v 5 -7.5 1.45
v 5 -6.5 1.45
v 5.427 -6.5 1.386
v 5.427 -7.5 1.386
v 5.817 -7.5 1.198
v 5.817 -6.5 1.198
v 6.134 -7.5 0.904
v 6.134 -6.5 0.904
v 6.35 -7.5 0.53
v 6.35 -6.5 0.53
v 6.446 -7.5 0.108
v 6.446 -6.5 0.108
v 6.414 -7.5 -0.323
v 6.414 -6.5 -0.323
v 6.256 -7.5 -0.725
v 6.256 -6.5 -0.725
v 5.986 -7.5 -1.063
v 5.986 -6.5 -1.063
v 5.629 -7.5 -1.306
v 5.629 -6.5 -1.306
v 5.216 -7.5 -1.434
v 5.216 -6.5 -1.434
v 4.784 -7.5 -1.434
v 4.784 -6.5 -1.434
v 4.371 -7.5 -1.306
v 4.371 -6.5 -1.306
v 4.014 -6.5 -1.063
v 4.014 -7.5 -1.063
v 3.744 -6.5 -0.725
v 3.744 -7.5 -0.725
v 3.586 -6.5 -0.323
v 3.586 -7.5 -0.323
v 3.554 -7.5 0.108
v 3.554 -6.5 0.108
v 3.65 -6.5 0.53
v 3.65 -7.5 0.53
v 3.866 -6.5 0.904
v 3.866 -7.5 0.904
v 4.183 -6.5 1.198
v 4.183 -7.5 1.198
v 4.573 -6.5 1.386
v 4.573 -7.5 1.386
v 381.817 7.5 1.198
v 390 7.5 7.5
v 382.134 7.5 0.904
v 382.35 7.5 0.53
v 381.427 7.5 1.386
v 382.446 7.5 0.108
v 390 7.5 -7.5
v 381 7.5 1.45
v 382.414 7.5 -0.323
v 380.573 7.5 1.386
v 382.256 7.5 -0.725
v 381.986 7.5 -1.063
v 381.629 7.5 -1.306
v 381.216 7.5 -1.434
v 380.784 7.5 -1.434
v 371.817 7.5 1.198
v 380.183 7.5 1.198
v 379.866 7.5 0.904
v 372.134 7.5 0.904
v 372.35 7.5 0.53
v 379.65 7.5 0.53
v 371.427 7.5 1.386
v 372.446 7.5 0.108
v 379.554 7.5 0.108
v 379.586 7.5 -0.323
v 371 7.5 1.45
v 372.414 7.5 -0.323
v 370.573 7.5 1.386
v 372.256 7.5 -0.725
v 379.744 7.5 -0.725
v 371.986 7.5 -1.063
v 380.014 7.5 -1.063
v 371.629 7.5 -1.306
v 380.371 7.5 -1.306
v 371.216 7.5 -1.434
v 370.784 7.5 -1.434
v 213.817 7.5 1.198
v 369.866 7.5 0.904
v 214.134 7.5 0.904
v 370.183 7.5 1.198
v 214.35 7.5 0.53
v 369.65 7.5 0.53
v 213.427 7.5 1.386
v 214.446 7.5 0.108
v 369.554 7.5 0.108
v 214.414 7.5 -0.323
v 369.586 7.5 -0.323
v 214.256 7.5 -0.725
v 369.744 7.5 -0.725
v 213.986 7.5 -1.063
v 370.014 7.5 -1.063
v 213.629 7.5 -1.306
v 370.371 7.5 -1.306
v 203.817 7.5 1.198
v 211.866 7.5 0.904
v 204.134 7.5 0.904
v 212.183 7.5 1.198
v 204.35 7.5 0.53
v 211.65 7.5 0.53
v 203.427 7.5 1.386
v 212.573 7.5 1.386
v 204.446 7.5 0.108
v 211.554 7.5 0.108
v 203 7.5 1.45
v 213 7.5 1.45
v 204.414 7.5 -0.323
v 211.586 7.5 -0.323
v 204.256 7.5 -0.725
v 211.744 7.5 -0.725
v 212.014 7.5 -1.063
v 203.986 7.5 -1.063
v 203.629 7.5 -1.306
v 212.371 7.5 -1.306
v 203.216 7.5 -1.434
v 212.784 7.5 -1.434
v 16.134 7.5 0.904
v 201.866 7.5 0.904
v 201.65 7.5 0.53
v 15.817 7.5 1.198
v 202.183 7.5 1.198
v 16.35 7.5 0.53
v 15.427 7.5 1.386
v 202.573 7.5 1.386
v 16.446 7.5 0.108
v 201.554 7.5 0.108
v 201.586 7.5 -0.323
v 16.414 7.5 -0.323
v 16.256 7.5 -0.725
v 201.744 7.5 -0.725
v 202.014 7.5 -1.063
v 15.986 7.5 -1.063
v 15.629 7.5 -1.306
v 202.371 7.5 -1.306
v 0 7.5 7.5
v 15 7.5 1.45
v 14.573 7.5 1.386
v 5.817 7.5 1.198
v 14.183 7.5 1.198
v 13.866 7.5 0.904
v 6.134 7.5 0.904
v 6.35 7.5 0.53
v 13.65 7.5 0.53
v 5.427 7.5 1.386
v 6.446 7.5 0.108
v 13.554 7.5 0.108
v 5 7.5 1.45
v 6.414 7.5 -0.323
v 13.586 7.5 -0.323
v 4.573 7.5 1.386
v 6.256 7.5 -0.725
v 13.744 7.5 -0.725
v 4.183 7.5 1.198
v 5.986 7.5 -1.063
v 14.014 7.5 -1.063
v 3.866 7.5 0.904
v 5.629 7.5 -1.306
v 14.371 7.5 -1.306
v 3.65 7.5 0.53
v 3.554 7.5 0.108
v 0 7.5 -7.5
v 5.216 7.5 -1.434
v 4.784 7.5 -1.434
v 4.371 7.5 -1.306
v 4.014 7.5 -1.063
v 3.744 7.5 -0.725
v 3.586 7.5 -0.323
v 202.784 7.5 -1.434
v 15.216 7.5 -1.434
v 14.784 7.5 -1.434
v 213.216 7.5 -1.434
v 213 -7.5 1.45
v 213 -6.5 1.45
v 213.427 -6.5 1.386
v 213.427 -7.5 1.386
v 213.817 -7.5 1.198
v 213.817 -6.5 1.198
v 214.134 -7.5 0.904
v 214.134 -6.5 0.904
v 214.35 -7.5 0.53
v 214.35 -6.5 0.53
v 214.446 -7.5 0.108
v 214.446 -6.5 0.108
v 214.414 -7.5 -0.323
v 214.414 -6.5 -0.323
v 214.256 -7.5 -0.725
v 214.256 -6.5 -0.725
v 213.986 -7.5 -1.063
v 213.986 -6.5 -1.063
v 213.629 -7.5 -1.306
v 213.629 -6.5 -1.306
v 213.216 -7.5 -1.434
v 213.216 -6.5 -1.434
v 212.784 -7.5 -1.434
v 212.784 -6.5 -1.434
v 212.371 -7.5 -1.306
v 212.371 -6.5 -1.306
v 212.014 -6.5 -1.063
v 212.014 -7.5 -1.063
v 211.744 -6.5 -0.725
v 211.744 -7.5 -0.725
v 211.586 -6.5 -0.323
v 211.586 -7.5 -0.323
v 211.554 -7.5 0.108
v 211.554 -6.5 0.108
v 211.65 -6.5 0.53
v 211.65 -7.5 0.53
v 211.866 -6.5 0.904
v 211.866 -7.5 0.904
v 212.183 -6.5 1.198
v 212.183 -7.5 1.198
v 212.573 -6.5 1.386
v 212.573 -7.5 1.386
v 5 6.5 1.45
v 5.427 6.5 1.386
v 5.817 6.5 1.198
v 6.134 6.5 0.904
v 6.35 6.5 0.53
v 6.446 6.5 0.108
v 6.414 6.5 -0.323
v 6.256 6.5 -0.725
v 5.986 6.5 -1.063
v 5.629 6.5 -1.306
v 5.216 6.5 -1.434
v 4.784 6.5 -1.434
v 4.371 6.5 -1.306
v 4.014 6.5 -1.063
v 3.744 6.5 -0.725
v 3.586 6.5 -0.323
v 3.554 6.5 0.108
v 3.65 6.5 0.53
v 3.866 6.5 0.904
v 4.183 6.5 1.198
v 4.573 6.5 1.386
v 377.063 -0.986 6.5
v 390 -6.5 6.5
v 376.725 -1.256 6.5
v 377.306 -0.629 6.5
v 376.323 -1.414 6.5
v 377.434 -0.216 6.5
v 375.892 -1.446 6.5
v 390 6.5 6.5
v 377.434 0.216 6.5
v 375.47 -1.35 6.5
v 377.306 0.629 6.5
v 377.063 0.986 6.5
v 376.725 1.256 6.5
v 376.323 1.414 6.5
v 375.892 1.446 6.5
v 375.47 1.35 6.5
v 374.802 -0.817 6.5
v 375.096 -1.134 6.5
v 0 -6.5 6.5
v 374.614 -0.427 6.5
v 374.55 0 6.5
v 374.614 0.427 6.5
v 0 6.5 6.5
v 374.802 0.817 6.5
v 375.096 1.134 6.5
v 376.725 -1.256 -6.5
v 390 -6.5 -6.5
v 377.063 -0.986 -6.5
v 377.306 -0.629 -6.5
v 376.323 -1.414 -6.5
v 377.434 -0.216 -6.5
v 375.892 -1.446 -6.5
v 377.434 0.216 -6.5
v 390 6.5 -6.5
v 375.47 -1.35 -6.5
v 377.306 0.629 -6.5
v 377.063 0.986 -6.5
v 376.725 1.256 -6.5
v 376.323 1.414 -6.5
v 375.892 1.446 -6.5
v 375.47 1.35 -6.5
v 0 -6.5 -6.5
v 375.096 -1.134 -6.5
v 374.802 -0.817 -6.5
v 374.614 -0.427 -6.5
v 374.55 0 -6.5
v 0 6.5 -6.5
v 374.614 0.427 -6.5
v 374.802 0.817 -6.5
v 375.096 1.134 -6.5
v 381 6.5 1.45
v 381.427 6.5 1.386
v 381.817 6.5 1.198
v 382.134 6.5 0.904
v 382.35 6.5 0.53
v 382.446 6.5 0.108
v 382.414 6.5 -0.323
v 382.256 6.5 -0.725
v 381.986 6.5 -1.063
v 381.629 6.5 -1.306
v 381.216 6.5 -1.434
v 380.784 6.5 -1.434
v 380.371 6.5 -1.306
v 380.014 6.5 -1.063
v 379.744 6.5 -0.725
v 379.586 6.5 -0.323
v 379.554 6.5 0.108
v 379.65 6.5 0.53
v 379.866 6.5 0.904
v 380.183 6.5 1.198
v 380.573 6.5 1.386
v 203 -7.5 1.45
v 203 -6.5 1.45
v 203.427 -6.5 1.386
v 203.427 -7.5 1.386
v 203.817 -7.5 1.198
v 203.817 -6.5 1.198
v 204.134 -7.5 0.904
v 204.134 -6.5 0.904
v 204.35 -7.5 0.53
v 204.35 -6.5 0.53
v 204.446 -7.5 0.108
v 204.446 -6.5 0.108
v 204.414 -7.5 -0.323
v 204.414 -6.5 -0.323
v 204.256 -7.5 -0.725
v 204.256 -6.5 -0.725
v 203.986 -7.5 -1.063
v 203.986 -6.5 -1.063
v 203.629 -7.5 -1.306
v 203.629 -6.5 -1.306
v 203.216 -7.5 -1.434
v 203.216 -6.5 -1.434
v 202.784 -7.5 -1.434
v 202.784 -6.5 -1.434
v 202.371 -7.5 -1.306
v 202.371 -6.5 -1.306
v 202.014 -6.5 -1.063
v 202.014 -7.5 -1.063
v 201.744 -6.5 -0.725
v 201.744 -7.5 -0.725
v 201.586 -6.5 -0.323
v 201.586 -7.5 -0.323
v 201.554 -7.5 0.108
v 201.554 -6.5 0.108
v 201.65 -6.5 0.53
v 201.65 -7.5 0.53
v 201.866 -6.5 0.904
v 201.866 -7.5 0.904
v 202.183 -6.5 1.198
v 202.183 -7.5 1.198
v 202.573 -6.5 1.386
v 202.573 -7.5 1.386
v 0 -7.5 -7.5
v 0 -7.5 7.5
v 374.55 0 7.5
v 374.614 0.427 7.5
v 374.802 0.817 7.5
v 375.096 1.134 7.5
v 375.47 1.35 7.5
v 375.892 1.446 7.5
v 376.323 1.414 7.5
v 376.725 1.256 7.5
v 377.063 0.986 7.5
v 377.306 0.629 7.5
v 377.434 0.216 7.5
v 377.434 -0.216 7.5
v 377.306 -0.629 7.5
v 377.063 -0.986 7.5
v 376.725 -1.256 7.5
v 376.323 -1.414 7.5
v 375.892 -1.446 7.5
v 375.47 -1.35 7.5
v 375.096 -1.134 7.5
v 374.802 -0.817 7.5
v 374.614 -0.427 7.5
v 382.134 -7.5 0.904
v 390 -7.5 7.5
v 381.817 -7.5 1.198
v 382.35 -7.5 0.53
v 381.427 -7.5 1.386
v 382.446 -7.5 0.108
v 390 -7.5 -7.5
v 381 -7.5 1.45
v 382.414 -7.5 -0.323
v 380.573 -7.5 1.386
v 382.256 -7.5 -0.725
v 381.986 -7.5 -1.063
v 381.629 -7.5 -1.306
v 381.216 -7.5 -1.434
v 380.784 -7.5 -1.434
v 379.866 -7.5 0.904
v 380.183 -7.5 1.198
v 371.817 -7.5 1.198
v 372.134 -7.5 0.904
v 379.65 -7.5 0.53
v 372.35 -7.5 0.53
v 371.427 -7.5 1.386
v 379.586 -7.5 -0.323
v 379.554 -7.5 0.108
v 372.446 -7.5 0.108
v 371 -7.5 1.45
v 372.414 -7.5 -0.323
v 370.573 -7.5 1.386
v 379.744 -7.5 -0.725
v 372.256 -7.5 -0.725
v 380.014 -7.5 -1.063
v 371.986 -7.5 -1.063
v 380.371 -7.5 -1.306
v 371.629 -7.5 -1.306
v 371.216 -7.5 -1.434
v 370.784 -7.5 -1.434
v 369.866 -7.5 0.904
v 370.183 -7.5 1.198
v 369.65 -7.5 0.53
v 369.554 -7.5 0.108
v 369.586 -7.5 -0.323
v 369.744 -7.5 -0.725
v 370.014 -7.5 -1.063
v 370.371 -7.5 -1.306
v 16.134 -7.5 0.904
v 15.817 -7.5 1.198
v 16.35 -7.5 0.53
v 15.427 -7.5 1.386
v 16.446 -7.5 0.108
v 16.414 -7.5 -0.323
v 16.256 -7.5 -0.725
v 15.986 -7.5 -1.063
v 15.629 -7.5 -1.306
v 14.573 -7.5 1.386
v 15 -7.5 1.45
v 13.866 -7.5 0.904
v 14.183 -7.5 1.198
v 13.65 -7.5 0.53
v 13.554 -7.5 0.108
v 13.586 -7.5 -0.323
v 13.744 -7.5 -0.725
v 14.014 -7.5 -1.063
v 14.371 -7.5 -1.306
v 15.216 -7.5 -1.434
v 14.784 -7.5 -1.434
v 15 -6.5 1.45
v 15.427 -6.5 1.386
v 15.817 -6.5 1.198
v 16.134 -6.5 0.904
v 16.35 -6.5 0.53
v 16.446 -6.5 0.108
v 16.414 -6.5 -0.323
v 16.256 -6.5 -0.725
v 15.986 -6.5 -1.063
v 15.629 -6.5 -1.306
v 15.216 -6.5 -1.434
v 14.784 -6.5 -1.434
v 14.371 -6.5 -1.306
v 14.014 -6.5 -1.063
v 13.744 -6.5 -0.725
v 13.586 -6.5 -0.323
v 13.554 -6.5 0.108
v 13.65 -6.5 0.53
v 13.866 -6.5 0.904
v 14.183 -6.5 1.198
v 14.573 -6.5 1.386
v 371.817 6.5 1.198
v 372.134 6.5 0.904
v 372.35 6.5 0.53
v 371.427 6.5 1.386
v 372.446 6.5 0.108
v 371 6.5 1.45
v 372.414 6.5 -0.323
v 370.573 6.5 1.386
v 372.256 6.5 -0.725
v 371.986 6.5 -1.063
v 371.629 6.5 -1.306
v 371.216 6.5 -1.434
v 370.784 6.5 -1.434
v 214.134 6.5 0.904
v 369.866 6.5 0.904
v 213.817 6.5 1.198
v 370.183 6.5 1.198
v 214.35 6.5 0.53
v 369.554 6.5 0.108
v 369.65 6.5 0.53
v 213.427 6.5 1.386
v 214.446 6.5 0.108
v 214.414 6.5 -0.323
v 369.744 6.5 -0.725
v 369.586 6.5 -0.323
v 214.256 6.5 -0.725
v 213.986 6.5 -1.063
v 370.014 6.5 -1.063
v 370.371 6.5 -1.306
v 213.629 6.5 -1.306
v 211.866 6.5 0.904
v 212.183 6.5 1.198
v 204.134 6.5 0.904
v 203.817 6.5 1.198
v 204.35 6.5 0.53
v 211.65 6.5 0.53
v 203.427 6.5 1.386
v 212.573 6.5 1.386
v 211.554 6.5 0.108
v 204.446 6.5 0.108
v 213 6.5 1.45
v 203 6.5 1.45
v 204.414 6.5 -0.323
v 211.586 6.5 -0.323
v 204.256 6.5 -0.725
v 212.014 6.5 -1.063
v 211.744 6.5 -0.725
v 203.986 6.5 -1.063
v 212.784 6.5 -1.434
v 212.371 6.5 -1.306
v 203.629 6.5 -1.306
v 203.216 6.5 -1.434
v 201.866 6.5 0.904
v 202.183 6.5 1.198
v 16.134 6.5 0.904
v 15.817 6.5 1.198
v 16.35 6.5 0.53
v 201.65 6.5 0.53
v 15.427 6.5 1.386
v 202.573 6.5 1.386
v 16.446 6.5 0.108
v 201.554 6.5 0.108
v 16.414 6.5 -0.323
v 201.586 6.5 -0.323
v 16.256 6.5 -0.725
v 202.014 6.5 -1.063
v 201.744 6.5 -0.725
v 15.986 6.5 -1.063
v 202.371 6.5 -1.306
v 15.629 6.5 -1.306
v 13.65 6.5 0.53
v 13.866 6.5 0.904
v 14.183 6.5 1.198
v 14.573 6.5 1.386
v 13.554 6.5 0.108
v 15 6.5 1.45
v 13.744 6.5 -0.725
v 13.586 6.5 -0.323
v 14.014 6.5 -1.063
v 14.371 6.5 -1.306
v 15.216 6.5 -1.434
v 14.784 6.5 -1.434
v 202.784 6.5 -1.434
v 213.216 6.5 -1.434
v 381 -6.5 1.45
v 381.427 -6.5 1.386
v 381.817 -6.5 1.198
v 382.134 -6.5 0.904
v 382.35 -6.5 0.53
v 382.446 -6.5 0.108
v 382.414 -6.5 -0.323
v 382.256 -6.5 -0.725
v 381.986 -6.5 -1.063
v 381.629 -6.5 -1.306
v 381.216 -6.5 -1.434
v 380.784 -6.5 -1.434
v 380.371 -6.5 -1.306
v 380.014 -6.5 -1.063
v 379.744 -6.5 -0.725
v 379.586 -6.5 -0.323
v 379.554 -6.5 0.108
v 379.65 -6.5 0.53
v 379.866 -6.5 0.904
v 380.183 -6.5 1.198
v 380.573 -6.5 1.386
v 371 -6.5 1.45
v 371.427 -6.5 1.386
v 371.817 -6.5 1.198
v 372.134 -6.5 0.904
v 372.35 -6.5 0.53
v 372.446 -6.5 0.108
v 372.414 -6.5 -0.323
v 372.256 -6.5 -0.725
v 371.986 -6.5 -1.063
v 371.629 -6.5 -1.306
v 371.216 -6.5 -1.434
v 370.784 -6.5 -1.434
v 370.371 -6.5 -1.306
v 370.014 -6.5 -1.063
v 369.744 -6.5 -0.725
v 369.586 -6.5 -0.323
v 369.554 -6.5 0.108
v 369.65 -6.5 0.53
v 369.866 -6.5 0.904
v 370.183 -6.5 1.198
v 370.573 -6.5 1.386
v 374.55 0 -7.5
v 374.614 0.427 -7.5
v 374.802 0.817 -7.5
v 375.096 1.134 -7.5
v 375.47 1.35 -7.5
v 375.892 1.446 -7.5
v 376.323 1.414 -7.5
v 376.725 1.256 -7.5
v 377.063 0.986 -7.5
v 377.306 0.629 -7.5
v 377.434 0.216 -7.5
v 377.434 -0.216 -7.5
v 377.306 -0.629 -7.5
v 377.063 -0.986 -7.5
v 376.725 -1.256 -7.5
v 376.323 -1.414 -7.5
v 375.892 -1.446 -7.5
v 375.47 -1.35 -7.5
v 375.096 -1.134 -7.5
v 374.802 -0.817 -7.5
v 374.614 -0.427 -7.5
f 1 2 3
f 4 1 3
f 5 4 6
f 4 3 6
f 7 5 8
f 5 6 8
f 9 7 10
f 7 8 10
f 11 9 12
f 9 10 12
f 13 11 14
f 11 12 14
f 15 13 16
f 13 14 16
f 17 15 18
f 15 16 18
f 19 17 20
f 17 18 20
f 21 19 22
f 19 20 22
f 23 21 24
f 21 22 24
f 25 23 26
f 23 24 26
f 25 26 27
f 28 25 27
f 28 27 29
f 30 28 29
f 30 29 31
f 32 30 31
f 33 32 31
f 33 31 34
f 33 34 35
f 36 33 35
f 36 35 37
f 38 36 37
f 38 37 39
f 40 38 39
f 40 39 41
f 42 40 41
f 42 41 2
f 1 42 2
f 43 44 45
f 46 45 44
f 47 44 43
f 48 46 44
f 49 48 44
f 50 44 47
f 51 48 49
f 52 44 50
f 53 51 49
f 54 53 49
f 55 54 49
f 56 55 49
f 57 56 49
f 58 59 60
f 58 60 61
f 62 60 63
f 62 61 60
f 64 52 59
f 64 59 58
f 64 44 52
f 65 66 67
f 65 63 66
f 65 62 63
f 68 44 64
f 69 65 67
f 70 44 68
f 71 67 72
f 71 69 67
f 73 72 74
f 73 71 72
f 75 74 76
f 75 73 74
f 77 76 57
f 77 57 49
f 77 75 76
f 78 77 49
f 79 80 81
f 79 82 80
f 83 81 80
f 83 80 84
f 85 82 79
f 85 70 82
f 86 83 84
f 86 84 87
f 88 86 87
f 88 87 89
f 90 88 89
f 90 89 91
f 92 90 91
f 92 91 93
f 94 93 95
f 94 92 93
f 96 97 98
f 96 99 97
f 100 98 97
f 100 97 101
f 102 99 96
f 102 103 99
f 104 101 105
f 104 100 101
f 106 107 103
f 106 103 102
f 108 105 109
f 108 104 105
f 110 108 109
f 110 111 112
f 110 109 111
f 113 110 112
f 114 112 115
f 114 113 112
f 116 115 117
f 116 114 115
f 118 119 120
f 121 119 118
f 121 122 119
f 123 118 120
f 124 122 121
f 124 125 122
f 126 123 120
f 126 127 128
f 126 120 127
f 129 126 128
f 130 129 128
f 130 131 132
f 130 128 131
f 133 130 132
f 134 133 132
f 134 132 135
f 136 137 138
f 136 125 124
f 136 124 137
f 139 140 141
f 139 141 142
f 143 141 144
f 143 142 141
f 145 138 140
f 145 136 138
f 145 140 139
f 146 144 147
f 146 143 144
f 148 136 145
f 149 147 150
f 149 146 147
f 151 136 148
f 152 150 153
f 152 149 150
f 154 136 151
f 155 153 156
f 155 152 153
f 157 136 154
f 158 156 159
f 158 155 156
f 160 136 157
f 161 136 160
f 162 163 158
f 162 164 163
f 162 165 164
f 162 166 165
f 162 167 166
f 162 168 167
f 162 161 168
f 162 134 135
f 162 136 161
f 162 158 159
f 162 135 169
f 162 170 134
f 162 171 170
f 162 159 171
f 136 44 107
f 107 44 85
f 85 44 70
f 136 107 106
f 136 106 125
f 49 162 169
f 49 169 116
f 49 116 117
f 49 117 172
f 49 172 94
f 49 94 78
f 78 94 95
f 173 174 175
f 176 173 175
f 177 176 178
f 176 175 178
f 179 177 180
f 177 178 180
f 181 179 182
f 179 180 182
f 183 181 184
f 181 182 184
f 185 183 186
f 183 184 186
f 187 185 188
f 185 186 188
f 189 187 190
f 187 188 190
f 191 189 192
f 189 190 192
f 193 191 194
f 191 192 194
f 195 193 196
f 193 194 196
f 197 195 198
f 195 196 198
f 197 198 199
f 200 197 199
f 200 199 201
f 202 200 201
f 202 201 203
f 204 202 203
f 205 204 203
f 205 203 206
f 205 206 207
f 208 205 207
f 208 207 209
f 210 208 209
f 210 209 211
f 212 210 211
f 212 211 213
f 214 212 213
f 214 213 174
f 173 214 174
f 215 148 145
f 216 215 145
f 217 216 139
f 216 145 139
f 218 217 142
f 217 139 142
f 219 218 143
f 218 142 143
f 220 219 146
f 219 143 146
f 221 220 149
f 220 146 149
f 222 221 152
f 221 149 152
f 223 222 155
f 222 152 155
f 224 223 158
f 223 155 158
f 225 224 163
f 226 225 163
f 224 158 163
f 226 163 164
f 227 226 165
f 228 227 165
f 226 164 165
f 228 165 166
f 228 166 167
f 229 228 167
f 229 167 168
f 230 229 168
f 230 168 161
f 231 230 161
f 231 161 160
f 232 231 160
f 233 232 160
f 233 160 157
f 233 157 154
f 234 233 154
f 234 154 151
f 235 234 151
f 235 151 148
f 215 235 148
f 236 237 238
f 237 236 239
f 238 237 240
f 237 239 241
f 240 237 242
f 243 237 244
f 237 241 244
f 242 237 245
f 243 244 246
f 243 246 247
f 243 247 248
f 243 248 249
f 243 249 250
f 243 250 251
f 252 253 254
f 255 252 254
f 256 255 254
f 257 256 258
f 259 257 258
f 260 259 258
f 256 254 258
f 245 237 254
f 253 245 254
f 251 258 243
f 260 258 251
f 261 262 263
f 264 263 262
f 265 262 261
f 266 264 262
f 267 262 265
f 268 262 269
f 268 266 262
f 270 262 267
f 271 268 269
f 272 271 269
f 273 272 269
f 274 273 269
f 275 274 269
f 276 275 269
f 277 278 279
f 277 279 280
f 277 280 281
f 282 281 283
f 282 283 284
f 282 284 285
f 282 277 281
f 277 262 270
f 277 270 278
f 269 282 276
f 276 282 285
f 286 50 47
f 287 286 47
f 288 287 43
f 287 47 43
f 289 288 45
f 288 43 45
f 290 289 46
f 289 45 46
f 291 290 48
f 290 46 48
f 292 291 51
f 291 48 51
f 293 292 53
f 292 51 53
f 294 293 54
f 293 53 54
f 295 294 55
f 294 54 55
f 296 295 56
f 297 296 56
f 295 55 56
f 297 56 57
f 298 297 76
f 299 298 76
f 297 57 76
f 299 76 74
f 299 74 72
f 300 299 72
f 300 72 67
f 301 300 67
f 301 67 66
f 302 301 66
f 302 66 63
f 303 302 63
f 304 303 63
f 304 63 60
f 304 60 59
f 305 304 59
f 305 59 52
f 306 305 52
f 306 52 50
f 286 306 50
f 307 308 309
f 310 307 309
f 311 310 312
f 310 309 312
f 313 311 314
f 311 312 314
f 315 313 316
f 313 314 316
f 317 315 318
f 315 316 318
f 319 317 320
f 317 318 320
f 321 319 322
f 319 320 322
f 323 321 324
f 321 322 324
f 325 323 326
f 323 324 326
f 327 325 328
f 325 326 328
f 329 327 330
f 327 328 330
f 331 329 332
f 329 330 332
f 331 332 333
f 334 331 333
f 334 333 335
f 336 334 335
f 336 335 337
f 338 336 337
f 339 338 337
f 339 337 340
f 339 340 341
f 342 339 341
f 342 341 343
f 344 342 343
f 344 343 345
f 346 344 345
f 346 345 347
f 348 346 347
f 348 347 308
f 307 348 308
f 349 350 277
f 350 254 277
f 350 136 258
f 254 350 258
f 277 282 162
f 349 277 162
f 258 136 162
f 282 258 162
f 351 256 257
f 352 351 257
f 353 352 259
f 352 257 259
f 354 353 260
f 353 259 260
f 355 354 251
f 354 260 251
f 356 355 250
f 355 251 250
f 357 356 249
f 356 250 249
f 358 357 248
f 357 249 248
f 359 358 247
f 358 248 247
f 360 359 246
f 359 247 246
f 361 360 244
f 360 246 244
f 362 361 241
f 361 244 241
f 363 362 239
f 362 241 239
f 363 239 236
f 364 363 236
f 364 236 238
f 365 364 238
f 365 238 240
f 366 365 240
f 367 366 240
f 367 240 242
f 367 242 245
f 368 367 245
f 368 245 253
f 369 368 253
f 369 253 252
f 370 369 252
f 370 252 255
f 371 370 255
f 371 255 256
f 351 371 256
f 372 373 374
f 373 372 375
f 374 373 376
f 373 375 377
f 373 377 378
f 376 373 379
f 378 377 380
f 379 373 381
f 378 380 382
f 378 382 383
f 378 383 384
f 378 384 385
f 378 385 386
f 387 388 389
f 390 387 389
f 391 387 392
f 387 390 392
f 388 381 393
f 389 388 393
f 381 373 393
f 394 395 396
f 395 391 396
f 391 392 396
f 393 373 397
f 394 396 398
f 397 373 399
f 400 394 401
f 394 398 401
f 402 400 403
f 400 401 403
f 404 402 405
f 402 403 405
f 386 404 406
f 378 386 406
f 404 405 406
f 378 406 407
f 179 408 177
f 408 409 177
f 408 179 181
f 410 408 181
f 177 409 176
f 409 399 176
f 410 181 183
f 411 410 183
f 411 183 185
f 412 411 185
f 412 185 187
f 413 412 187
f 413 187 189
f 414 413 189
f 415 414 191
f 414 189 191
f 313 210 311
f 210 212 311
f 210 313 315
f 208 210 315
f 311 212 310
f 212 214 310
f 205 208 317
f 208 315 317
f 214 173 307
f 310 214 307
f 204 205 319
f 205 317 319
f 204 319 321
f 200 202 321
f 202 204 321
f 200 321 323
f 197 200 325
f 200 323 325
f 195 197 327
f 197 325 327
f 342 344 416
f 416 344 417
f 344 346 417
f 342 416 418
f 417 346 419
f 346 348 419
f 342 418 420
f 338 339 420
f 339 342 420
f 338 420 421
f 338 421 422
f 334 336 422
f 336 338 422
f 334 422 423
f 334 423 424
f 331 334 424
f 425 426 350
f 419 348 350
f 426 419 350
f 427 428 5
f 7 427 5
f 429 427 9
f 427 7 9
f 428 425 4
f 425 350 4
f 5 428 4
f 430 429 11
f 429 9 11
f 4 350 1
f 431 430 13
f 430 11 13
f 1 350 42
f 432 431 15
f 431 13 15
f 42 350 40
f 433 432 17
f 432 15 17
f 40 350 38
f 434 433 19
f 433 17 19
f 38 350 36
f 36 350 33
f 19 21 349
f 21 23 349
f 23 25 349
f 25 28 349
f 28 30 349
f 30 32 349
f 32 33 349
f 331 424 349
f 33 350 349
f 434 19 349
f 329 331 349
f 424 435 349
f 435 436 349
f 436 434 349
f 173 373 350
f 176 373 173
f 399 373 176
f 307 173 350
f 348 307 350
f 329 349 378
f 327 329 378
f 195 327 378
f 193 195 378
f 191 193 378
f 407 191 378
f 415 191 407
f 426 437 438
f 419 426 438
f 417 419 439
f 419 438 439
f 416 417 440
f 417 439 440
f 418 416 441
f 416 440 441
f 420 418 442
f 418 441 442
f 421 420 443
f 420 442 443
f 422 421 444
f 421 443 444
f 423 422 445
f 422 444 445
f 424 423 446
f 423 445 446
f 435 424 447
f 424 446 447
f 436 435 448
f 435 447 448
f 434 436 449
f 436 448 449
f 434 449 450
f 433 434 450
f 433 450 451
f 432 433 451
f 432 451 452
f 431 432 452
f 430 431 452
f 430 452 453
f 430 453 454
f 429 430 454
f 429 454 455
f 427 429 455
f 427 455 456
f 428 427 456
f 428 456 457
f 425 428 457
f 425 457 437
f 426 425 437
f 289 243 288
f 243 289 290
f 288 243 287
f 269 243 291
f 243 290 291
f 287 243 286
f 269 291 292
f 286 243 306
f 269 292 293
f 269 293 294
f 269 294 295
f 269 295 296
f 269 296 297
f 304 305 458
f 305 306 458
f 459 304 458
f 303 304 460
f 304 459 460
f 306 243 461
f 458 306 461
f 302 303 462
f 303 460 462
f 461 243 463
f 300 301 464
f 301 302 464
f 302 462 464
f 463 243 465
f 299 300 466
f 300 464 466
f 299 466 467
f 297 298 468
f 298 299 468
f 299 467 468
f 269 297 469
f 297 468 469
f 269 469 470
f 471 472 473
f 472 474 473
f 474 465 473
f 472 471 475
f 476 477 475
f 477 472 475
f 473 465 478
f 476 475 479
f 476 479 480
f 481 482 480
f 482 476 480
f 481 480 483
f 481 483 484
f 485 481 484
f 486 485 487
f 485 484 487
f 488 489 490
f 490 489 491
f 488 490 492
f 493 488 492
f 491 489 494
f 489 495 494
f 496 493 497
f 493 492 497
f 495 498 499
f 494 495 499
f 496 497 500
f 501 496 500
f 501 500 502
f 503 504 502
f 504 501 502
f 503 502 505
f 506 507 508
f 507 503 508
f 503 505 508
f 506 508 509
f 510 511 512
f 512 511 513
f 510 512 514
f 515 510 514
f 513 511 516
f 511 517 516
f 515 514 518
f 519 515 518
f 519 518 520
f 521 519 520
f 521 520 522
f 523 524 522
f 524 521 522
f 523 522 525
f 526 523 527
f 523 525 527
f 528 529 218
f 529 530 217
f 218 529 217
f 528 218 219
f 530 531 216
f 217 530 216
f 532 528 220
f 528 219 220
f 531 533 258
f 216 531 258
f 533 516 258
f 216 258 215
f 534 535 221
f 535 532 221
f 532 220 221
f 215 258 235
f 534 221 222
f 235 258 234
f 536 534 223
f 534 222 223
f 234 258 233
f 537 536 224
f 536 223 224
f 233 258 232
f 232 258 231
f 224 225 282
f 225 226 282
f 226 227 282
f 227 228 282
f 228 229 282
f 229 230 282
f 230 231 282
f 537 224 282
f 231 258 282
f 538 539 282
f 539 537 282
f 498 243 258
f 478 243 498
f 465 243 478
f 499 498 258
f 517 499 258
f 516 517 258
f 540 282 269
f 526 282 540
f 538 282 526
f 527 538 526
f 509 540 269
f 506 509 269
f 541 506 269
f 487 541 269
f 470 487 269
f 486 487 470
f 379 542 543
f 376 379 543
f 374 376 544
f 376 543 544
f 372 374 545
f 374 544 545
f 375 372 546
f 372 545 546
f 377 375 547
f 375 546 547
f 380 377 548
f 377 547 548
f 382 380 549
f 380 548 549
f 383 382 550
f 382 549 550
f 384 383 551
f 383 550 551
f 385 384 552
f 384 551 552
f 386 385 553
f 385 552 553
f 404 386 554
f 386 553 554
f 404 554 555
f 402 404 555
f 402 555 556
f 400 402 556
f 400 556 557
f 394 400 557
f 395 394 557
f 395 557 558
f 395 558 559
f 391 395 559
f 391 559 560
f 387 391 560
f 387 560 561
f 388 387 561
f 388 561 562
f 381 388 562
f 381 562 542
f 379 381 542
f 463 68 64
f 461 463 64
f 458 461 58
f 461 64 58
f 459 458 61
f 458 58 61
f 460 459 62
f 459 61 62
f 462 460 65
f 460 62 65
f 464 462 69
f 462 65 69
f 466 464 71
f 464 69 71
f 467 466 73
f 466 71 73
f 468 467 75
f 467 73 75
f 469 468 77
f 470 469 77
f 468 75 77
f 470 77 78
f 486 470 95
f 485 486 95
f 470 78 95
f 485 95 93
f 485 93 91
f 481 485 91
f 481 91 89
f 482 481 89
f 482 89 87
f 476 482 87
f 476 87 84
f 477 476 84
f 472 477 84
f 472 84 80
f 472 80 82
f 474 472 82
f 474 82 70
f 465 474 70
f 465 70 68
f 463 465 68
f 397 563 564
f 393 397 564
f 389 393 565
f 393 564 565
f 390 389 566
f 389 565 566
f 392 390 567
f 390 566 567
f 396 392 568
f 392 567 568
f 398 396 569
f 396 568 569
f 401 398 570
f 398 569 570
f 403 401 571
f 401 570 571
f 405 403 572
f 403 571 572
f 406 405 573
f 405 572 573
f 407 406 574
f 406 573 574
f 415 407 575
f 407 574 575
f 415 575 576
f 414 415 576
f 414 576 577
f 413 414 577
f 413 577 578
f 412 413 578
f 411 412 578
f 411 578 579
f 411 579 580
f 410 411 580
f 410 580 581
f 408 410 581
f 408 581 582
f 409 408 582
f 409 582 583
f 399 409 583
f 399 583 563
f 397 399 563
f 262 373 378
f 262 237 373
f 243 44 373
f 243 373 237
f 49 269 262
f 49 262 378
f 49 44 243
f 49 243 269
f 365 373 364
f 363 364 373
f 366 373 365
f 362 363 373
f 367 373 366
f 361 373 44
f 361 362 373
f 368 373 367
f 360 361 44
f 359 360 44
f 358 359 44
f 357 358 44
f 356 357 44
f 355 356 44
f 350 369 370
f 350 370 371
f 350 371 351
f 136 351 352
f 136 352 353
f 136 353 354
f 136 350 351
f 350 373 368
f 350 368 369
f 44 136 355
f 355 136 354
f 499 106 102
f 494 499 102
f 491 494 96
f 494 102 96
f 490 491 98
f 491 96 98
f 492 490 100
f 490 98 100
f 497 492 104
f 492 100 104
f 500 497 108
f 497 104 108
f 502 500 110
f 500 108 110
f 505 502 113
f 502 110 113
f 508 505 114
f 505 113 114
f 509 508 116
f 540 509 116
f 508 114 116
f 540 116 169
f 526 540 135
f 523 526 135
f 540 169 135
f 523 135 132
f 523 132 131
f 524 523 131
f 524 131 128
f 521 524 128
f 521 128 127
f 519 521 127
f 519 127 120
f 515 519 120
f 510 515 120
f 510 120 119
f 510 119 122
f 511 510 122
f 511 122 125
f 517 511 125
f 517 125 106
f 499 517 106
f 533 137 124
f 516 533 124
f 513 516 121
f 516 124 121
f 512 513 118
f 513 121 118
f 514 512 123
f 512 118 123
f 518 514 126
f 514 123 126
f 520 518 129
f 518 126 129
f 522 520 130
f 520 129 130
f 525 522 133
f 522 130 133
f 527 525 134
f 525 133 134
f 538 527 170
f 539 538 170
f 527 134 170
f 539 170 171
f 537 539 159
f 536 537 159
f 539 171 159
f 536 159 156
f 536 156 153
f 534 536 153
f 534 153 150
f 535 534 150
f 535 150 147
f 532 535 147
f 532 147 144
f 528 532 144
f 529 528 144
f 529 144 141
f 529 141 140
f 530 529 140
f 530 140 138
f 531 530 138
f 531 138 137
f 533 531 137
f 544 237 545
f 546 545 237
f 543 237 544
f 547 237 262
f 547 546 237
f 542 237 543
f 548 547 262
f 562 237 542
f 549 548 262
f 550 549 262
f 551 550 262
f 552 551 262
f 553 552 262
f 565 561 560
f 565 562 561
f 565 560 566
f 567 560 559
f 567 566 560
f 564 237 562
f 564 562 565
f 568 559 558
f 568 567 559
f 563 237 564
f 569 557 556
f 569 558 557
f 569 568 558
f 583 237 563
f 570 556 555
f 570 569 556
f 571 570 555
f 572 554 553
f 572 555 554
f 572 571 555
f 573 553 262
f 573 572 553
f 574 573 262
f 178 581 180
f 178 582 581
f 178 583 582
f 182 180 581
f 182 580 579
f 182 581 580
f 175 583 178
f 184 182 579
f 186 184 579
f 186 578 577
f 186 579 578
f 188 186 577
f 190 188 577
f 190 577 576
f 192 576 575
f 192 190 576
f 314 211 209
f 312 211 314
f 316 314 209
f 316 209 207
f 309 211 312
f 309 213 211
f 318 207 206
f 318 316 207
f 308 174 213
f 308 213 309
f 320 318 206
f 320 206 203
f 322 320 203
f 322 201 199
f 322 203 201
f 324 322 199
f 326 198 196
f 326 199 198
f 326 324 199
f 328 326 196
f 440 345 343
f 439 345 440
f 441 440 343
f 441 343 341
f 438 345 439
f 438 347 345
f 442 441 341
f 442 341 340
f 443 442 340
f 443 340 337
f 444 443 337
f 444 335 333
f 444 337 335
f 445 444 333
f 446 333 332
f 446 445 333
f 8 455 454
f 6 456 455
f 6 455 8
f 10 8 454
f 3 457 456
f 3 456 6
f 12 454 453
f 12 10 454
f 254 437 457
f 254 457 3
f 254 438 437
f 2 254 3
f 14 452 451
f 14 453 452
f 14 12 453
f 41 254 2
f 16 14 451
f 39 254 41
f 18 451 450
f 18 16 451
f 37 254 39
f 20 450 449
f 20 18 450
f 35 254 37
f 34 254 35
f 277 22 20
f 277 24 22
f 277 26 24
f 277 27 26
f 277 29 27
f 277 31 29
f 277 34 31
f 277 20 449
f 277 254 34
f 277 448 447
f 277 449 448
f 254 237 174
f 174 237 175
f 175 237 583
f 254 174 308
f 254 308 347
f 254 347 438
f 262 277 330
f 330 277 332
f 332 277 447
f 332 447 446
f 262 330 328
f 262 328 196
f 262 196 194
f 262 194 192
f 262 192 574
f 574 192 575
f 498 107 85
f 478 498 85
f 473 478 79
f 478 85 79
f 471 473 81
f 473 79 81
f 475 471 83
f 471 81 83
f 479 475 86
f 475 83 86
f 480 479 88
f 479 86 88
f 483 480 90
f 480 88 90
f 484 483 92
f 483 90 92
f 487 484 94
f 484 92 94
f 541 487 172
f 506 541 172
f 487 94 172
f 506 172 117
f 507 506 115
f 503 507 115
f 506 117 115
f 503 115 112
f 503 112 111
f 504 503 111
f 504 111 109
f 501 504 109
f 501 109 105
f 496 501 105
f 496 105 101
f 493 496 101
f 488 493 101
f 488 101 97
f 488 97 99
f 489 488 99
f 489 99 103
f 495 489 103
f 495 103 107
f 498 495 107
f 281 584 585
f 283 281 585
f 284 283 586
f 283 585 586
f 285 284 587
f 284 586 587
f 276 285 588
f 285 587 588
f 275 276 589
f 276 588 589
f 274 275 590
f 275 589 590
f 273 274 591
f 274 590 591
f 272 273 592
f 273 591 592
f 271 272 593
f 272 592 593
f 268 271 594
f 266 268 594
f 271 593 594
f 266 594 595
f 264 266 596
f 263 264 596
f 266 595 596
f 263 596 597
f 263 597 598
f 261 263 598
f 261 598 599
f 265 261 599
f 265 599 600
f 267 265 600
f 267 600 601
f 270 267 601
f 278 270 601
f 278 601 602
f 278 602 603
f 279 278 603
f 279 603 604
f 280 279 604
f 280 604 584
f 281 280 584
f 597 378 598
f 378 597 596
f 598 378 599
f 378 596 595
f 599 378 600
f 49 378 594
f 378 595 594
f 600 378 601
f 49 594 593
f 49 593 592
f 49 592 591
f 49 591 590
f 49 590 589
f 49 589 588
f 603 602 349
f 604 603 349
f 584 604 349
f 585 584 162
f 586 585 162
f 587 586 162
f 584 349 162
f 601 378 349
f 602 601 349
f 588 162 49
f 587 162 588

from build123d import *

# Parameters (mm, degrees)
SKETCH_1_W          = 15
SKETCH_1_H          = 15
SKETCH_1_W_2        = 13
SKETCH_1_H_2        = 13
EXTRUDE_1_DEPTH     = 390
SKETCH_2_R          = 1.45
CUT_EXTRUDE_1_DEPTH = 391.36041039
SKETCH_3_R          = 1.45
CUT_EXTRUDE_2_DEPTH = 391.36041039


with BuildPart() as part:
    # 草图1 → 凸台-拉伸1 (new body)
    with BuildSketch(Plane(origin=(0, 0, 0), x_dir=(0, 0, -1), z_dir=(1, 0, 0))):
        Rectangle(SKETCH_1_W, SKETCH_1_H)
        Rectangle(SKETCH_1_W_2, SKETCH_1_H_2, mode=Mode.SUBTRACT)
    extrude(amount=EXTRUDE_1_DEPTH)

    # 草图2 → 切除-拉伸1 (cut, through all)
    with BuildSketch(Plane(origin=(0, 7.5, 0), x_dir=(1, 0, 0), z_dir=(0, 1, 0))):
        with Locations(Location((203, 0, 0), (0, 0, 270))):
            Circle(SKETCH_2_R)
        with Locations(Location((213, 0, 0), (0, 0, 270))):
            Circle(SKETCH_2_R)
        with Locations(Location((15, 0, 0), (0, 0, 270))):
            Circle(SKETCH_2_R)
        with Locations(Location((5, 0, 0), (0, 0, 270))):
            Circle(SKETCH_2_R)
        with Locations(Location((381, 0, 0), (0, 0, 270))):
            Circle(SKETCH_2_R)
        with Locations(Location((371, 0, 0), (0, 0, 270))):
            Circle(SKETCH_2_R)
    extrude(amount=-CUT_EXTRUDE_1_DEPTH, mode=Mode.SUBTRACT)

    # 草图3 → 切除-拉伸2 (cut, through all)
    with BuildSketch(Plane(origin=(0, 0, -7.5), x_dir=(-1, 0, 0), z_dir=(0, 0, -1))):
        with Locations((-376, 0)):
            Circle(SKETCH_3_R)
    extrude(amount=-CUT_EXTRUDE_2_DEPTH, mode=Mode.SUBTRACT)


solid = part.part
